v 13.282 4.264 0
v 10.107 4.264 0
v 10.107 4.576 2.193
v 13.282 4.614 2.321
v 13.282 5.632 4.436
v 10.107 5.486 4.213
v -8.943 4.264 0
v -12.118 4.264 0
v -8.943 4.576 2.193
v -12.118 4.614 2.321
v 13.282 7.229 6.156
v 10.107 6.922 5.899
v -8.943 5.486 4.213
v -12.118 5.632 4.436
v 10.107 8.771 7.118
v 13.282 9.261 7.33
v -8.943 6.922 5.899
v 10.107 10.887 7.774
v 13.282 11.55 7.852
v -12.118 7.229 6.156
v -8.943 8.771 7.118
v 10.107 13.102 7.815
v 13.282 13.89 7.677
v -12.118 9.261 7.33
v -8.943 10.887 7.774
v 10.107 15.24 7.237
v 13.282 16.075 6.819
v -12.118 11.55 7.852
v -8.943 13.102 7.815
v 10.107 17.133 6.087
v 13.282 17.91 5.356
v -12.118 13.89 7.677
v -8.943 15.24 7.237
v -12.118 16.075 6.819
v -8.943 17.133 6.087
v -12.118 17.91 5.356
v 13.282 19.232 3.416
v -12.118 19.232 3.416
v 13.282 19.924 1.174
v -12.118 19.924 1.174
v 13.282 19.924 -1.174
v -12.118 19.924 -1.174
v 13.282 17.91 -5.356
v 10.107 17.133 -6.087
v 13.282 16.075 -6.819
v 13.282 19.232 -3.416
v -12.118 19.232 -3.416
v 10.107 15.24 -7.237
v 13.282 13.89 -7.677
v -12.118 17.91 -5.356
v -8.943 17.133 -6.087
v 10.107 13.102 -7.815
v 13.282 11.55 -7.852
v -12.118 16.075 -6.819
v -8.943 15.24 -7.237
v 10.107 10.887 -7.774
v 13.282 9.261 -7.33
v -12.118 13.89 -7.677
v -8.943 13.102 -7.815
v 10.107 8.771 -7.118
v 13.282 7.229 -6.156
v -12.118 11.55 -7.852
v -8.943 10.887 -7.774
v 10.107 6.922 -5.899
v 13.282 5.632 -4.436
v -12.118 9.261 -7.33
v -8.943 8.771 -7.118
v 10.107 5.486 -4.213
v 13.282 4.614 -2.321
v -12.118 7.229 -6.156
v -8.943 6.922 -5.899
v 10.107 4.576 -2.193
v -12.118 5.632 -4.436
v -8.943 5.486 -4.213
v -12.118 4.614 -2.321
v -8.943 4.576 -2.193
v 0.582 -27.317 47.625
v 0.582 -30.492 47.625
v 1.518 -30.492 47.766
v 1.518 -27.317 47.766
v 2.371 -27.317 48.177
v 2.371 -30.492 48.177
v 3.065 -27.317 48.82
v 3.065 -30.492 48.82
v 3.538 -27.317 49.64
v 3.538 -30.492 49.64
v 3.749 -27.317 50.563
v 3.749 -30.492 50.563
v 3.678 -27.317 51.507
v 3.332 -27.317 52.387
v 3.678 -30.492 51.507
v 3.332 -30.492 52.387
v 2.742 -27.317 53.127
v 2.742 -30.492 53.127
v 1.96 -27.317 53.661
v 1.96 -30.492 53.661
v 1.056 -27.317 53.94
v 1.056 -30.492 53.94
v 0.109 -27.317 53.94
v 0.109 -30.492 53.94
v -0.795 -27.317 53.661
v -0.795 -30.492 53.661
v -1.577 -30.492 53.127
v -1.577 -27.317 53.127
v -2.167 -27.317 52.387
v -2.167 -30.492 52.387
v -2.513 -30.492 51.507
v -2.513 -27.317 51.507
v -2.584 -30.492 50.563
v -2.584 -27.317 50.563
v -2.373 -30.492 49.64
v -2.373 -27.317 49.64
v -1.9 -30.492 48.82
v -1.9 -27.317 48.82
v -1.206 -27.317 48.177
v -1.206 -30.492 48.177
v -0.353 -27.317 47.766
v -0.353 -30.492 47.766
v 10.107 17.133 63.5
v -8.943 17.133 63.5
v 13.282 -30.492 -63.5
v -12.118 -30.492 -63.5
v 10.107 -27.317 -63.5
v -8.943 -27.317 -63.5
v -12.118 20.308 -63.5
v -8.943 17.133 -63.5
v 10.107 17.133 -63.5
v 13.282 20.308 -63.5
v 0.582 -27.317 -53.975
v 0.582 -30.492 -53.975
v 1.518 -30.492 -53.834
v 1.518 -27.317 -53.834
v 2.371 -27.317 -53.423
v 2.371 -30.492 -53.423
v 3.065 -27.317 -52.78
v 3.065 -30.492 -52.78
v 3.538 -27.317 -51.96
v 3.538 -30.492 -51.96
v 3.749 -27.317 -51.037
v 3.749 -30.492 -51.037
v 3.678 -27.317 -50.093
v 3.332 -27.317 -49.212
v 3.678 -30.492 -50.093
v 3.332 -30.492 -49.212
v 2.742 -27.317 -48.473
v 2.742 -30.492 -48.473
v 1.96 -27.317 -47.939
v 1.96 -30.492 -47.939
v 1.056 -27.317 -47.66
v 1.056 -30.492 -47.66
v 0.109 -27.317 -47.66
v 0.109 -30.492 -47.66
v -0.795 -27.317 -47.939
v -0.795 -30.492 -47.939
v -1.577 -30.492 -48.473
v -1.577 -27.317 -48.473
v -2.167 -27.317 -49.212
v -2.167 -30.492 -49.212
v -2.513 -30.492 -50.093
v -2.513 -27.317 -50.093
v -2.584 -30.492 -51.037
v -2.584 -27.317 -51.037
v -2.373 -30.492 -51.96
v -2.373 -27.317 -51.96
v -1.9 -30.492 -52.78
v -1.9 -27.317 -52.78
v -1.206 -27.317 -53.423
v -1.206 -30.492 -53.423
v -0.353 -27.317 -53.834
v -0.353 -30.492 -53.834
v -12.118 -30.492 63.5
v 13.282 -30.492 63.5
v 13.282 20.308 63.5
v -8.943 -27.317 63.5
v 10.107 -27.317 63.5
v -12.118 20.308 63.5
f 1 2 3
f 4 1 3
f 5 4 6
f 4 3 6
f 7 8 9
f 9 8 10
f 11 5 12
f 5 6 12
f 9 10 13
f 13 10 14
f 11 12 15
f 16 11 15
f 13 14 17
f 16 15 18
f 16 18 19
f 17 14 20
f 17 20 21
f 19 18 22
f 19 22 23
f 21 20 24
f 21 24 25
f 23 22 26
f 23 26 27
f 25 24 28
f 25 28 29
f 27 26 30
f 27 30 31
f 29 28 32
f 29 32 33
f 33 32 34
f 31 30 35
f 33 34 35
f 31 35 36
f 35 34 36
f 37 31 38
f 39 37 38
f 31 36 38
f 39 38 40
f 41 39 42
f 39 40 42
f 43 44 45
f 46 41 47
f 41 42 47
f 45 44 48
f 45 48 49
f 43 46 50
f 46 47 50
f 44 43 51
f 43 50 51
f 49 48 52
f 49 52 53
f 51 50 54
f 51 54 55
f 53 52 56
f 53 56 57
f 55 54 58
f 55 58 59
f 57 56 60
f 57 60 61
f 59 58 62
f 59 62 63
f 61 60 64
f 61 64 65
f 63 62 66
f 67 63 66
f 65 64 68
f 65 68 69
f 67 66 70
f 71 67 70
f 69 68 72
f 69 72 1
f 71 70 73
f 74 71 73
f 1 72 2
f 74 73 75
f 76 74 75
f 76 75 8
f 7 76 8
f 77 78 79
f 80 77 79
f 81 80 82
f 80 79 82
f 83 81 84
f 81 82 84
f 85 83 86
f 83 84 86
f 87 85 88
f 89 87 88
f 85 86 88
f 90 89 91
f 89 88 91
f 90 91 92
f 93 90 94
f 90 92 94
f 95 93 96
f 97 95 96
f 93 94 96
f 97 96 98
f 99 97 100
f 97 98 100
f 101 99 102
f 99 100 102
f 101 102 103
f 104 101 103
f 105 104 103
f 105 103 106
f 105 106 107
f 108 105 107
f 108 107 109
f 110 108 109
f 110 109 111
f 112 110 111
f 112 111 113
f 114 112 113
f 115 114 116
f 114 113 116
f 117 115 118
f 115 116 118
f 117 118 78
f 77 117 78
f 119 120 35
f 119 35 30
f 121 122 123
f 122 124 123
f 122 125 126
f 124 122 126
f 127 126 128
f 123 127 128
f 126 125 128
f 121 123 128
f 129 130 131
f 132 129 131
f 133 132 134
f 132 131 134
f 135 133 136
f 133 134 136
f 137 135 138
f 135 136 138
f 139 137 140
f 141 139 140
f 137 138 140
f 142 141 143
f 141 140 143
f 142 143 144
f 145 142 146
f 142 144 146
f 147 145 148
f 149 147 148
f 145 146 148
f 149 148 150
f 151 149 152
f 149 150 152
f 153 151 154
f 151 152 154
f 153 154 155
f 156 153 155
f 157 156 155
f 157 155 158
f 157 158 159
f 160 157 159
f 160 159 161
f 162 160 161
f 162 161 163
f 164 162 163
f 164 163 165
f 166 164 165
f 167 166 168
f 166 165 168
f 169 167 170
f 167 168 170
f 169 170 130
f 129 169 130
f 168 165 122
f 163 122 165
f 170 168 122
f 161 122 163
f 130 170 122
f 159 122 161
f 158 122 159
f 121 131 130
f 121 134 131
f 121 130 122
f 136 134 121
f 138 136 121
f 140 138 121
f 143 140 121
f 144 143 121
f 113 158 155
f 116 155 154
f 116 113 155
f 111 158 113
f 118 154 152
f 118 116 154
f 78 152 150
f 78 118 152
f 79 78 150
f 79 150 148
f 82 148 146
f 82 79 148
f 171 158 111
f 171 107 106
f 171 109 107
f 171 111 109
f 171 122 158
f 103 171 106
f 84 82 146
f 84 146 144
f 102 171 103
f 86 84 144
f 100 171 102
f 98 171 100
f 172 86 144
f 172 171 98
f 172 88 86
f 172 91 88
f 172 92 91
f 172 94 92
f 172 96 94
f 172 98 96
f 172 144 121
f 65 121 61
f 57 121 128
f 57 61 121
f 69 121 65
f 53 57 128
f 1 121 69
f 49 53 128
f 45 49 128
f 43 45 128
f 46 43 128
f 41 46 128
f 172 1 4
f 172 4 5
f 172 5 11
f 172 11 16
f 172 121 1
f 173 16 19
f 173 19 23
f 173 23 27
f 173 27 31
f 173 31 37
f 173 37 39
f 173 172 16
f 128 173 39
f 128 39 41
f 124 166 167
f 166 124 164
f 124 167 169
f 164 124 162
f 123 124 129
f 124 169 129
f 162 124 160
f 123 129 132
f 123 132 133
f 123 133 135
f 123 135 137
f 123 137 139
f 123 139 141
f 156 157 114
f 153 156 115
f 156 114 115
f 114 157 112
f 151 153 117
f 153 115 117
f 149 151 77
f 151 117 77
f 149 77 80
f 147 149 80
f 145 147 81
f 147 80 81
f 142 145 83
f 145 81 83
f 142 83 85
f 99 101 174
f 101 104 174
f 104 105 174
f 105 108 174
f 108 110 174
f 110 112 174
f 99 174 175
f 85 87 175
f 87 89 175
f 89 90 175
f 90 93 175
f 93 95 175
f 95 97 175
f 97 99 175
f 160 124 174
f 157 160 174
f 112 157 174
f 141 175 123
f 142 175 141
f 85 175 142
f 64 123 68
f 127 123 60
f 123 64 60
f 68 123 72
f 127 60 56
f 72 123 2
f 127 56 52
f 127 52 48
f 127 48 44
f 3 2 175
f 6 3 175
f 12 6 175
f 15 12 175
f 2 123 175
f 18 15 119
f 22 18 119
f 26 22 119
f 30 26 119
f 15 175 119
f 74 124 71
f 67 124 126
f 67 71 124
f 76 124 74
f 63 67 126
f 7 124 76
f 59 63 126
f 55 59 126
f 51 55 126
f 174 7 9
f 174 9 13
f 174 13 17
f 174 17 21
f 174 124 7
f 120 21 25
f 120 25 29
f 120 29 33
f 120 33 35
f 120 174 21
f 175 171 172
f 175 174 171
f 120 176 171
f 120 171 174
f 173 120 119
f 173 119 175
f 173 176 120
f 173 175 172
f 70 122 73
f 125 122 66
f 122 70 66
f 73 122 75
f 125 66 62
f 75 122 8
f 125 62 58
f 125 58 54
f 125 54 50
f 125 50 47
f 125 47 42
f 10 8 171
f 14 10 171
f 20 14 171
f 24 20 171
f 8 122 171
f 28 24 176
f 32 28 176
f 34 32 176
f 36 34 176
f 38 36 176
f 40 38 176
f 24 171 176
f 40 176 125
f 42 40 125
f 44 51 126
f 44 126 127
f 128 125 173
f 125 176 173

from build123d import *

# Parameters (mm, degrees)
SKETCH1_W           = 25.4
SKETCH1_H           = 50.8
SKETCH1_W_2         = 19.05
SKETCH1_H_2         = 44.45
BOSS_EXTRUDE1_DEPTH = 63.5
SKETCH2_R           = 7.874
CUT_EXTRUDE1_DEPTH  = 25.4
SKETCH3_R           = 3.175
CUT_EXTRUDE2_DEPTH  = 3.175


with BuildPart() as part:
    # Sketch1 → Boss-Extrude1 (new, symmetric)
    with BuildSketch(Plane.XY):
        with Locations((0.582385658, -5.091775964)):
            Rectangle(SKETCH1_W, SKETCH1_H)
        with Locations((0.582385658, -5.091775964)):
            Rectangle(SKETCH1_W_2, SKETCH1_H_2, mode=Mode.SUBTRACT)
    extrude(amount=BOSS_EXTRUDE1_DEPTH, both=True)

    # Sketch2 → Cut-Extrude1 (cut)
    with BuildSketch(Plane.ZY.offset(12.117614342)):
        with Locations(Location((0, 12.138059528, 0), (0, 0, 270))):
            Circle(SKETCH2_R)
    extrude(amount=-CUT_EXTRUDE1_DEPTH, mode=Mode.SUBTRACT)

    # Sketch3 → Cut-Extrude2 (cut)
    with BuildSketch(Plane.XZ.offset(30.491775964)):
        with Locations(Location((0.582385658, 50.8, 0), (0, 0, 270))):
            Circle(SKETCH3_R)
        with Locations(Location((0.582385658, -50.8, 0), (0, 0, 270))):
            Circle(SKETCH3_R)
    extrude(amount=-CUT_EXTRUDE2_DEPTH, mode=Mode.SUBTRACT)


solid = part.part
